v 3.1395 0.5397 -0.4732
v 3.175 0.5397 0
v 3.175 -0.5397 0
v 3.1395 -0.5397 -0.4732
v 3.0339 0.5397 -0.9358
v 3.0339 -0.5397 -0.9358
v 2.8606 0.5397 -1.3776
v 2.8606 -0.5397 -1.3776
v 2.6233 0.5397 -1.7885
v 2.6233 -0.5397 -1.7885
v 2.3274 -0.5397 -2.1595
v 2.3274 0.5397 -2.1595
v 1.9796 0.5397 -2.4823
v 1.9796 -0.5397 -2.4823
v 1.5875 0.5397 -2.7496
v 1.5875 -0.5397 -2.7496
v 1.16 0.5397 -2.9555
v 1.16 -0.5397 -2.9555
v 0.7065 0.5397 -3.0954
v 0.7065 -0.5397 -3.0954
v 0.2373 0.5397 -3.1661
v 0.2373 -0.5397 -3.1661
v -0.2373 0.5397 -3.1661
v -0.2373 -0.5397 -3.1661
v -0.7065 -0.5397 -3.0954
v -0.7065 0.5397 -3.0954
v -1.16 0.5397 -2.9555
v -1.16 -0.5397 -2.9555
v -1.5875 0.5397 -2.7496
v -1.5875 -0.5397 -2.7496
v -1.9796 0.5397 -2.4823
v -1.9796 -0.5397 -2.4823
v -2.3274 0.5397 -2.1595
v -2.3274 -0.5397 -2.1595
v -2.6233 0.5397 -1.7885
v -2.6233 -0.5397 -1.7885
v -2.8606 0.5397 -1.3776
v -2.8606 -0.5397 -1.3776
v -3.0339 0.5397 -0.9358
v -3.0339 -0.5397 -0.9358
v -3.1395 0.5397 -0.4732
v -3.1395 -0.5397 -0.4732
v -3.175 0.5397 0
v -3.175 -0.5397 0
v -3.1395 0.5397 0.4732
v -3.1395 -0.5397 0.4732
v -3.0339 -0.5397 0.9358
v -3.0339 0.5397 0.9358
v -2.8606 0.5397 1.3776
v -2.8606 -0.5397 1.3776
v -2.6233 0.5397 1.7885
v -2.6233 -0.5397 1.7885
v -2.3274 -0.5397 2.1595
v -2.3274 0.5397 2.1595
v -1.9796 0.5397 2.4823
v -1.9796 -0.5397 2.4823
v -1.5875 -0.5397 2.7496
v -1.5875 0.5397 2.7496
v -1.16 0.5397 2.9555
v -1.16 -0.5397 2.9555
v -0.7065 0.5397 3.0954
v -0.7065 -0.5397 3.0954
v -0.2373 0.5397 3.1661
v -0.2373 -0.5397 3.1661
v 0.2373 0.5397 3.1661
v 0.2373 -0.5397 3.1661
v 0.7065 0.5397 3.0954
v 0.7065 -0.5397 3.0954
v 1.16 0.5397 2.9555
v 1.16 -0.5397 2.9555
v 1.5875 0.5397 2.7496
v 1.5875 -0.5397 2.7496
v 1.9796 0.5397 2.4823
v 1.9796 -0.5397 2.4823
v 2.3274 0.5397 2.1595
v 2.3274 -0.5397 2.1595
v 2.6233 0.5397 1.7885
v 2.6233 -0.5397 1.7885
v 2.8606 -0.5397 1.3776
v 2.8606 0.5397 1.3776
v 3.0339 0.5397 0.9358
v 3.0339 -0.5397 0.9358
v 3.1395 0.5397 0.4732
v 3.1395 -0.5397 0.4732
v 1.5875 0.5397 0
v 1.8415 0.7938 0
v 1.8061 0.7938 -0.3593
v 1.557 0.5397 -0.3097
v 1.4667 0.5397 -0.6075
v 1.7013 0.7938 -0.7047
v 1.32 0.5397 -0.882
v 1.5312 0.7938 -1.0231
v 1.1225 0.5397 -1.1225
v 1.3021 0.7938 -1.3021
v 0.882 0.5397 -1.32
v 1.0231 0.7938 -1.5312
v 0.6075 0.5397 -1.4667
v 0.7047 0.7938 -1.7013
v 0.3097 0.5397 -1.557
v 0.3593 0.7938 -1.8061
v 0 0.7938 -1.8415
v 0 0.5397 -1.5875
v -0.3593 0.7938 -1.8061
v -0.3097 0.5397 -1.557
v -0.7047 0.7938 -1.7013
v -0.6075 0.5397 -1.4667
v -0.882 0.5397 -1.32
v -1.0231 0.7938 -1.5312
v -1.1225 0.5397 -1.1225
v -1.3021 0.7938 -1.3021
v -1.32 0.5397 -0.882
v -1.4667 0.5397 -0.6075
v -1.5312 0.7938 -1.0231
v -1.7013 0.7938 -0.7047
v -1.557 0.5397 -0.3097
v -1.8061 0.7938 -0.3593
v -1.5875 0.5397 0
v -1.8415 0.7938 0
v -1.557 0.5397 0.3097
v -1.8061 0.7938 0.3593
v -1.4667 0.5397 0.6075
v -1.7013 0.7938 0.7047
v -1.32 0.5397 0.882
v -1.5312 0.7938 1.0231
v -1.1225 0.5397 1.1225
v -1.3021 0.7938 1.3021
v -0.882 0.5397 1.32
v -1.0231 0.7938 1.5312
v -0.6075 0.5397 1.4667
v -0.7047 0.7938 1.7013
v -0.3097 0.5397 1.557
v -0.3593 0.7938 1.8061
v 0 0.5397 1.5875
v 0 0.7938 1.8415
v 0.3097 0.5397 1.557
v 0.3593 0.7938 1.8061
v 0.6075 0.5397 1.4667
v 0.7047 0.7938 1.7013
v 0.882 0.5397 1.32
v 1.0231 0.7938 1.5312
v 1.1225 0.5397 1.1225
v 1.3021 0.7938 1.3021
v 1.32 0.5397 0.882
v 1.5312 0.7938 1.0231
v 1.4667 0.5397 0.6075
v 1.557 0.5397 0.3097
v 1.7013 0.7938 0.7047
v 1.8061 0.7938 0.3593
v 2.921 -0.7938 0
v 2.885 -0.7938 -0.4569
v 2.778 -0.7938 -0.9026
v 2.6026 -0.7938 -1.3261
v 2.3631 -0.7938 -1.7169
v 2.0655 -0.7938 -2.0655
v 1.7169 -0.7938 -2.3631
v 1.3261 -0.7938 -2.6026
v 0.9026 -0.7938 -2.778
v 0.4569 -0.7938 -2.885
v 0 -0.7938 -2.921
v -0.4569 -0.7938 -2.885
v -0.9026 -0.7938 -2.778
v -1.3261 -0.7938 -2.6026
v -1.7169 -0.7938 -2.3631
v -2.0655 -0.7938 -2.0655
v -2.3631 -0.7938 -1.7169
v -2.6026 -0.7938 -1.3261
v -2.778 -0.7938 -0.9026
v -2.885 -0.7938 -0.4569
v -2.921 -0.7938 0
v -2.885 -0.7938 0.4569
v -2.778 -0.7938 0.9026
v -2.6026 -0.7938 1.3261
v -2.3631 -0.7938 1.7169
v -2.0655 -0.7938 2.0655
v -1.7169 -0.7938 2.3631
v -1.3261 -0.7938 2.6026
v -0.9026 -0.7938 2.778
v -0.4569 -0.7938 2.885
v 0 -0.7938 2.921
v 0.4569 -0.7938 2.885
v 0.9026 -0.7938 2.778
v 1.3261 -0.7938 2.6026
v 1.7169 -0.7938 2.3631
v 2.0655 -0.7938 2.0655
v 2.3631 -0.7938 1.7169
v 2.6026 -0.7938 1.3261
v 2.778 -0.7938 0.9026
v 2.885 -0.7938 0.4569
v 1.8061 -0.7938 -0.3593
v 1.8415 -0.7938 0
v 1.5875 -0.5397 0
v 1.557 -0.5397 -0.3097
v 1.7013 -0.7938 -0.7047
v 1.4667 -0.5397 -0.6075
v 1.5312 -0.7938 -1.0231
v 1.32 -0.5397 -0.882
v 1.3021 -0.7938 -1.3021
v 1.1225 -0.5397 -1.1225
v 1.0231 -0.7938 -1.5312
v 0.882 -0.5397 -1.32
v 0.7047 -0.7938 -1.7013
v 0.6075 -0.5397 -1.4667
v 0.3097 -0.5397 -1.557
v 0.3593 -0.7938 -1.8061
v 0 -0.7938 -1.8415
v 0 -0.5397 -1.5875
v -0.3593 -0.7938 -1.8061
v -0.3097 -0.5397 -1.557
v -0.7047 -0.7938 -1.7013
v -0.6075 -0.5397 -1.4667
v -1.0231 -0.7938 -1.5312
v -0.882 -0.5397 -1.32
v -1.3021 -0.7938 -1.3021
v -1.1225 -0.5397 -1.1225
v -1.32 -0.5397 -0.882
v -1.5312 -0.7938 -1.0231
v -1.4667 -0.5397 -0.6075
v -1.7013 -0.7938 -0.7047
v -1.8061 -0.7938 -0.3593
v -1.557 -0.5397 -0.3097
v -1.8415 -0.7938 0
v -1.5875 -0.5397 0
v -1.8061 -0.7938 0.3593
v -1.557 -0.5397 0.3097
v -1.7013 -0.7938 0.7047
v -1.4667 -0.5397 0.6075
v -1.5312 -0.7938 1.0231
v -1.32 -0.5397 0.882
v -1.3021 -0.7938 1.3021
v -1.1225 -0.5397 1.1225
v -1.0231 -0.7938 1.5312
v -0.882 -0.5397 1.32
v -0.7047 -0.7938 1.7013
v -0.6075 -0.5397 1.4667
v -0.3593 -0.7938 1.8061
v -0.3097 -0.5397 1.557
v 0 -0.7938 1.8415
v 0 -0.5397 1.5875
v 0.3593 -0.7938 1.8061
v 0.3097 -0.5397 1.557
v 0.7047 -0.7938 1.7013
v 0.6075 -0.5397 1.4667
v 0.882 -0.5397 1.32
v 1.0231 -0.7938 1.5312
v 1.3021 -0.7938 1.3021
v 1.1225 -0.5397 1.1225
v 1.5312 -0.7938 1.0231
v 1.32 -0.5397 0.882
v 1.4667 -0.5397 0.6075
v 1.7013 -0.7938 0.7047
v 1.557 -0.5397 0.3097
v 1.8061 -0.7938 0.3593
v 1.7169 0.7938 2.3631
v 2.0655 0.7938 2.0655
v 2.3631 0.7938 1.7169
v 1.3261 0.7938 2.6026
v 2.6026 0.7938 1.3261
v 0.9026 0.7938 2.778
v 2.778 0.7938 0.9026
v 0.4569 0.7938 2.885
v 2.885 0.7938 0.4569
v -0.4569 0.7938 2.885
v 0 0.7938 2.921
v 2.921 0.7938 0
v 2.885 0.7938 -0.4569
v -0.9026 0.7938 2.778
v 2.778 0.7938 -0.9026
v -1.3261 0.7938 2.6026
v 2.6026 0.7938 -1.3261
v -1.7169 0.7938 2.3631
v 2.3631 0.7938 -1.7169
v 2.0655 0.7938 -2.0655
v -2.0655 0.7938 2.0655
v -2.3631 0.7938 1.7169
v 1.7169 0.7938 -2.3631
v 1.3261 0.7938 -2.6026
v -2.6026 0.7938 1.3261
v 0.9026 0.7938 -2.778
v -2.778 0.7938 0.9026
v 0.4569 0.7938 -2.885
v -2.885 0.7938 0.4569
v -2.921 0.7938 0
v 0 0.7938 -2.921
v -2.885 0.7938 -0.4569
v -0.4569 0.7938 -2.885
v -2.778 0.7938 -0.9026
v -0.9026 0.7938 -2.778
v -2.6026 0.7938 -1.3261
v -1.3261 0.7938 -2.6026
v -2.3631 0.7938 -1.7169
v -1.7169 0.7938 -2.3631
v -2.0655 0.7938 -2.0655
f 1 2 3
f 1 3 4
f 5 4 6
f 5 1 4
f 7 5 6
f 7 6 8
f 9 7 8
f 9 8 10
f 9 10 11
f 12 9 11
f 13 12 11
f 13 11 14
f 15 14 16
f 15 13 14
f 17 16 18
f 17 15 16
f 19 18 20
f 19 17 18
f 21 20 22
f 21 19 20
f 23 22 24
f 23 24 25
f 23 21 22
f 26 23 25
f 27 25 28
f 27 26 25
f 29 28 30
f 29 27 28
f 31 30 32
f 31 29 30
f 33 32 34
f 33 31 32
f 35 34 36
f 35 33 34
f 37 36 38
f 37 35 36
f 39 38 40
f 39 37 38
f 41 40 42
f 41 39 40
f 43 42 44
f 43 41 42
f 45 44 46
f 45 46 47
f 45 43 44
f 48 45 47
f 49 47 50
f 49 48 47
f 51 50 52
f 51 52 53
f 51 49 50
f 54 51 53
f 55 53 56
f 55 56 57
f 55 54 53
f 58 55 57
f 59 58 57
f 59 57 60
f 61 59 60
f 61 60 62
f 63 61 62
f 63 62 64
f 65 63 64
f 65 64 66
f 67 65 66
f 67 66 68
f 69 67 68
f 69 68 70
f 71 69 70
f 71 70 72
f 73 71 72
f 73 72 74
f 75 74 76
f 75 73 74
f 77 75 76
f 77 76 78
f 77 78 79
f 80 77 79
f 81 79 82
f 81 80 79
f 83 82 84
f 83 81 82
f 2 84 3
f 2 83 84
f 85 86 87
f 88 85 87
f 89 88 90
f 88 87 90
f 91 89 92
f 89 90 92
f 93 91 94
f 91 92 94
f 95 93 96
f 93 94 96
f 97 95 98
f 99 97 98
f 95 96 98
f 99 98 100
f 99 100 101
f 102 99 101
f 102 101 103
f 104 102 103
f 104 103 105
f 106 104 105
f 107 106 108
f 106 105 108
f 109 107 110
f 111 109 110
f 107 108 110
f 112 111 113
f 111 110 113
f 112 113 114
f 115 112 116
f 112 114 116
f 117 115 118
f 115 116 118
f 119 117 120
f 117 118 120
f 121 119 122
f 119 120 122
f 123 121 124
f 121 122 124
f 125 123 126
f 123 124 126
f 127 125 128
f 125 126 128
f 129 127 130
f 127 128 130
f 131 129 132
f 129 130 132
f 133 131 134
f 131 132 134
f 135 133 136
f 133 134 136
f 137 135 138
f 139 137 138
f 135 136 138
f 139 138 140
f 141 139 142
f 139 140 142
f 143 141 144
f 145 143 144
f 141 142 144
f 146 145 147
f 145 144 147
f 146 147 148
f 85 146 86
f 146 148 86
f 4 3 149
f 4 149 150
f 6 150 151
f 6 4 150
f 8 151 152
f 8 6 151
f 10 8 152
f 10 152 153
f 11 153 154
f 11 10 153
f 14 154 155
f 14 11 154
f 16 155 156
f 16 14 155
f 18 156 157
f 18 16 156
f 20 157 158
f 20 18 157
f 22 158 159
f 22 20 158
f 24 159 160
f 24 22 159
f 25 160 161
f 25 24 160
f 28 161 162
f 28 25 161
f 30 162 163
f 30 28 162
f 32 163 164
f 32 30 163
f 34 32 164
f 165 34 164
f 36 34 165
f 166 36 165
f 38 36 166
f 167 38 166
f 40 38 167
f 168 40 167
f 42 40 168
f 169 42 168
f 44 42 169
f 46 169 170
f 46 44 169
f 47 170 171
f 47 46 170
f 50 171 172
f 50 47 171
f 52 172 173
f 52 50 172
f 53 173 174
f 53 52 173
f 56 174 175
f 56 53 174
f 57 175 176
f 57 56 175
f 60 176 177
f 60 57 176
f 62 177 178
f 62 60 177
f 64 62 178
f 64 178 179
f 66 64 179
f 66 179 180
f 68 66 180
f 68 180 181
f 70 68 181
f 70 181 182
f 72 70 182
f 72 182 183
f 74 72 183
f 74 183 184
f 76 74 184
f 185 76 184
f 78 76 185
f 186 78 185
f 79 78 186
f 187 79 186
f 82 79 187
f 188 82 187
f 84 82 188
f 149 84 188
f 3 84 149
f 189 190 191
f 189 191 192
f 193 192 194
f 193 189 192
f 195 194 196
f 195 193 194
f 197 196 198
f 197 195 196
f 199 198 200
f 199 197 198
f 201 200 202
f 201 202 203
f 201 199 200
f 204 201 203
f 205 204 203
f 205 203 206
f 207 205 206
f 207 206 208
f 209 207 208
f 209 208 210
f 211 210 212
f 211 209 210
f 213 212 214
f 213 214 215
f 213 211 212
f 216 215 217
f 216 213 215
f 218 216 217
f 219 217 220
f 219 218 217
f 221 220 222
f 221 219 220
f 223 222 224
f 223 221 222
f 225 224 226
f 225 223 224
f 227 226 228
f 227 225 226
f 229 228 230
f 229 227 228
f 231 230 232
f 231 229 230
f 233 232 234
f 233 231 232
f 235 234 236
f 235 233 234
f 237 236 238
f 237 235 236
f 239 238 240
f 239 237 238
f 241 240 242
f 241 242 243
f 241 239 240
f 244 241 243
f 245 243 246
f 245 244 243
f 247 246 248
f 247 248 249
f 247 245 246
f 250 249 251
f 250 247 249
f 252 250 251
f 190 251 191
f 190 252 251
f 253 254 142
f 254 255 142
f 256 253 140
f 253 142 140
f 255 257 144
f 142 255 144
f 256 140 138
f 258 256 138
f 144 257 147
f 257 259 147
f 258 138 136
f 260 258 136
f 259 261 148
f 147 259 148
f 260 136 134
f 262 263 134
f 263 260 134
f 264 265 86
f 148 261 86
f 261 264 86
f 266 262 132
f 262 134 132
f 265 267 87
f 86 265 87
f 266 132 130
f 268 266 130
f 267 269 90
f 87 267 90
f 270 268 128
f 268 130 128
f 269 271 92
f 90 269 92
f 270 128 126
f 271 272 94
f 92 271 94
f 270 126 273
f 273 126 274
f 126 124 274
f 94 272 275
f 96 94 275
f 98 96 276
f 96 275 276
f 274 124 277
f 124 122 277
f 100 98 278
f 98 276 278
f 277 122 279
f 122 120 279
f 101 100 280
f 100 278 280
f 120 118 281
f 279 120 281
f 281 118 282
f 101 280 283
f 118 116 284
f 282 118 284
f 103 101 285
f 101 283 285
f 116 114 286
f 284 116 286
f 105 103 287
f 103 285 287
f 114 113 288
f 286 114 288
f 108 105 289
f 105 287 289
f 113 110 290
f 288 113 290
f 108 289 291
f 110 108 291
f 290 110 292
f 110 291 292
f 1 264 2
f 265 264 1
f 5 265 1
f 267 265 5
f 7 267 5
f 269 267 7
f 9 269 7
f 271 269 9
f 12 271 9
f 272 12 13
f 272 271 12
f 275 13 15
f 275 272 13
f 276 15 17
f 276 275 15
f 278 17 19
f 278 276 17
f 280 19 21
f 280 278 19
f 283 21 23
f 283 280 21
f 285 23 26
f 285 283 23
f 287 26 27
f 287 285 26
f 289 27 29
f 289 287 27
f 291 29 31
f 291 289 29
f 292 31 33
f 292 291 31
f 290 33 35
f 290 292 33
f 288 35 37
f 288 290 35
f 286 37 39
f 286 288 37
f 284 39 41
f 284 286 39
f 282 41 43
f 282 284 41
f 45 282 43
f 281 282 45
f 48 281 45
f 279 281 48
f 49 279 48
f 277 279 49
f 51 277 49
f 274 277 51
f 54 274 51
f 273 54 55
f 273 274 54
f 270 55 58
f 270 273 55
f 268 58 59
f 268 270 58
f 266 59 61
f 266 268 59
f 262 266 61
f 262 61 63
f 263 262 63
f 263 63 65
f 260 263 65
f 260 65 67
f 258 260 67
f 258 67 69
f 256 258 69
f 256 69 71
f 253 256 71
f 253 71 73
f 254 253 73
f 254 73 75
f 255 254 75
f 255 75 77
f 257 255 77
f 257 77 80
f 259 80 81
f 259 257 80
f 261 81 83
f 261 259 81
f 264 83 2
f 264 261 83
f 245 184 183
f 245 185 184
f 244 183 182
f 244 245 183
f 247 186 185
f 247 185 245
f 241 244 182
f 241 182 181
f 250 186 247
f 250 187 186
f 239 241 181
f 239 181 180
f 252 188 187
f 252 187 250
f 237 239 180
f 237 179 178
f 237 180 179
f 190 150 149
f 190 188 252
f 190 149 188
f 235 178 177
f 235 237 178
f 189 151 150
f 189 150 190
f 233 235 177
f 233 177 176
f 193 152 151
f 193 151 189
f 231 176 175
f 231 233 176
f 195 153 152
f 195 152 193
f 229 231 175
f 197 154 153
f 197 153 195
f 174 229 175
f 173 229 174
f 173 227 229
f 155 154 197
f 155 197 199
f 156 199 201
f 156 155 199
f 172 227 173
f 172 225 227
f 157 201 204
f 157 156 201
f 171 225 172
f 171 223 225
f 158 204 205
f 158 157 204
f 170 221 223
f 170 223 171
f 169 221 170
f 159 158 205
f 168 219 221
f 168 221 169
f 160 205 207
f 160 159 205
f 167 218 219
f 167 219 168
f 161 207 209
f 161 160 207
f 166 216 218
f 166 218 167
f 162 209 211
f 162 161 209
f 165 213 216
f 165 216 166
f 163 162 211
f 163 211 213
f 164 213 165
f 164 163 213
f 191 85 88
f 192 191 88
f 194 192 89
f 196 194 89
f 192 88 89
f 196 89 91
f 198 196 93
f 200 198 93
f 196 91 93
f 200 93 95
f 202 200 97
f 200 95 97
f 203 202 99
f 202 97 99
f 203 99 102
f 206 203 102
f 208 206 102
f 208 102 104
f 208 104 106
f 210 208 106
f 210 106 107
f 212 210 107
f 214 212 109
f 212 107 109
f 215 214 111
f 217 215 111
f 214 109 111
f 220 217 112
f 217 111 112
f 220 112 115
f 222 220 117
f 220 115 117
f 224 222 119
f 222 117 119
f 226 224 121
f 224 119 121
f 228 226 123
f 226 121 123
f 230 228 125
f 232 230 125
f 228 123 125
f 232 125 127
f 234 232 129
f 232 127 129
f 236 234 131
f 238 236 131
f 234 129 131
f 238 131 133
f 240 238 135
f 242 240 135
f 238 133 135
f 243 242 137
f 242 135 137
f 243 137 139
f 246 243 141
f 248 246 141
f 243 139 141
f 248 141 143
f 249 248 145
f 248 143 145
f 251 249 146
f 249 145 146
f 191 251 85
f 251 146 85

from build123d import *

# Parameters (mm, degrees)
SKETCH1_W     = 1.5875
SKETCH1_H     = 1.5875
CHAMFER1_SIZE = 0.254


with BuildPart() as part:
    # Sketch1 → Revolve1 (revolve)
    with BuildSketch(Plane.XY):
        with Locations((2.38125, 0)):
            Rectangle(SKETCH1_W, SKETCH1_H)
    revolve(axis=Axis((0, 0, 0), (0, 1, 0)))

    # Chamfer1
    chamfer1_edges = [part.edges().sort_by_distance(p)[0] for p in [
        (-1.5875, -0.79375, 0),
        (-3.175, -0.79375, 0),
        (-3.175, 0.79375, 0),
        (-1.5875, 0.79375, 0),
    ]]
    chamfer(chamfer1_edges, length=CHAMFER1_SIZE)


solid = part.part
